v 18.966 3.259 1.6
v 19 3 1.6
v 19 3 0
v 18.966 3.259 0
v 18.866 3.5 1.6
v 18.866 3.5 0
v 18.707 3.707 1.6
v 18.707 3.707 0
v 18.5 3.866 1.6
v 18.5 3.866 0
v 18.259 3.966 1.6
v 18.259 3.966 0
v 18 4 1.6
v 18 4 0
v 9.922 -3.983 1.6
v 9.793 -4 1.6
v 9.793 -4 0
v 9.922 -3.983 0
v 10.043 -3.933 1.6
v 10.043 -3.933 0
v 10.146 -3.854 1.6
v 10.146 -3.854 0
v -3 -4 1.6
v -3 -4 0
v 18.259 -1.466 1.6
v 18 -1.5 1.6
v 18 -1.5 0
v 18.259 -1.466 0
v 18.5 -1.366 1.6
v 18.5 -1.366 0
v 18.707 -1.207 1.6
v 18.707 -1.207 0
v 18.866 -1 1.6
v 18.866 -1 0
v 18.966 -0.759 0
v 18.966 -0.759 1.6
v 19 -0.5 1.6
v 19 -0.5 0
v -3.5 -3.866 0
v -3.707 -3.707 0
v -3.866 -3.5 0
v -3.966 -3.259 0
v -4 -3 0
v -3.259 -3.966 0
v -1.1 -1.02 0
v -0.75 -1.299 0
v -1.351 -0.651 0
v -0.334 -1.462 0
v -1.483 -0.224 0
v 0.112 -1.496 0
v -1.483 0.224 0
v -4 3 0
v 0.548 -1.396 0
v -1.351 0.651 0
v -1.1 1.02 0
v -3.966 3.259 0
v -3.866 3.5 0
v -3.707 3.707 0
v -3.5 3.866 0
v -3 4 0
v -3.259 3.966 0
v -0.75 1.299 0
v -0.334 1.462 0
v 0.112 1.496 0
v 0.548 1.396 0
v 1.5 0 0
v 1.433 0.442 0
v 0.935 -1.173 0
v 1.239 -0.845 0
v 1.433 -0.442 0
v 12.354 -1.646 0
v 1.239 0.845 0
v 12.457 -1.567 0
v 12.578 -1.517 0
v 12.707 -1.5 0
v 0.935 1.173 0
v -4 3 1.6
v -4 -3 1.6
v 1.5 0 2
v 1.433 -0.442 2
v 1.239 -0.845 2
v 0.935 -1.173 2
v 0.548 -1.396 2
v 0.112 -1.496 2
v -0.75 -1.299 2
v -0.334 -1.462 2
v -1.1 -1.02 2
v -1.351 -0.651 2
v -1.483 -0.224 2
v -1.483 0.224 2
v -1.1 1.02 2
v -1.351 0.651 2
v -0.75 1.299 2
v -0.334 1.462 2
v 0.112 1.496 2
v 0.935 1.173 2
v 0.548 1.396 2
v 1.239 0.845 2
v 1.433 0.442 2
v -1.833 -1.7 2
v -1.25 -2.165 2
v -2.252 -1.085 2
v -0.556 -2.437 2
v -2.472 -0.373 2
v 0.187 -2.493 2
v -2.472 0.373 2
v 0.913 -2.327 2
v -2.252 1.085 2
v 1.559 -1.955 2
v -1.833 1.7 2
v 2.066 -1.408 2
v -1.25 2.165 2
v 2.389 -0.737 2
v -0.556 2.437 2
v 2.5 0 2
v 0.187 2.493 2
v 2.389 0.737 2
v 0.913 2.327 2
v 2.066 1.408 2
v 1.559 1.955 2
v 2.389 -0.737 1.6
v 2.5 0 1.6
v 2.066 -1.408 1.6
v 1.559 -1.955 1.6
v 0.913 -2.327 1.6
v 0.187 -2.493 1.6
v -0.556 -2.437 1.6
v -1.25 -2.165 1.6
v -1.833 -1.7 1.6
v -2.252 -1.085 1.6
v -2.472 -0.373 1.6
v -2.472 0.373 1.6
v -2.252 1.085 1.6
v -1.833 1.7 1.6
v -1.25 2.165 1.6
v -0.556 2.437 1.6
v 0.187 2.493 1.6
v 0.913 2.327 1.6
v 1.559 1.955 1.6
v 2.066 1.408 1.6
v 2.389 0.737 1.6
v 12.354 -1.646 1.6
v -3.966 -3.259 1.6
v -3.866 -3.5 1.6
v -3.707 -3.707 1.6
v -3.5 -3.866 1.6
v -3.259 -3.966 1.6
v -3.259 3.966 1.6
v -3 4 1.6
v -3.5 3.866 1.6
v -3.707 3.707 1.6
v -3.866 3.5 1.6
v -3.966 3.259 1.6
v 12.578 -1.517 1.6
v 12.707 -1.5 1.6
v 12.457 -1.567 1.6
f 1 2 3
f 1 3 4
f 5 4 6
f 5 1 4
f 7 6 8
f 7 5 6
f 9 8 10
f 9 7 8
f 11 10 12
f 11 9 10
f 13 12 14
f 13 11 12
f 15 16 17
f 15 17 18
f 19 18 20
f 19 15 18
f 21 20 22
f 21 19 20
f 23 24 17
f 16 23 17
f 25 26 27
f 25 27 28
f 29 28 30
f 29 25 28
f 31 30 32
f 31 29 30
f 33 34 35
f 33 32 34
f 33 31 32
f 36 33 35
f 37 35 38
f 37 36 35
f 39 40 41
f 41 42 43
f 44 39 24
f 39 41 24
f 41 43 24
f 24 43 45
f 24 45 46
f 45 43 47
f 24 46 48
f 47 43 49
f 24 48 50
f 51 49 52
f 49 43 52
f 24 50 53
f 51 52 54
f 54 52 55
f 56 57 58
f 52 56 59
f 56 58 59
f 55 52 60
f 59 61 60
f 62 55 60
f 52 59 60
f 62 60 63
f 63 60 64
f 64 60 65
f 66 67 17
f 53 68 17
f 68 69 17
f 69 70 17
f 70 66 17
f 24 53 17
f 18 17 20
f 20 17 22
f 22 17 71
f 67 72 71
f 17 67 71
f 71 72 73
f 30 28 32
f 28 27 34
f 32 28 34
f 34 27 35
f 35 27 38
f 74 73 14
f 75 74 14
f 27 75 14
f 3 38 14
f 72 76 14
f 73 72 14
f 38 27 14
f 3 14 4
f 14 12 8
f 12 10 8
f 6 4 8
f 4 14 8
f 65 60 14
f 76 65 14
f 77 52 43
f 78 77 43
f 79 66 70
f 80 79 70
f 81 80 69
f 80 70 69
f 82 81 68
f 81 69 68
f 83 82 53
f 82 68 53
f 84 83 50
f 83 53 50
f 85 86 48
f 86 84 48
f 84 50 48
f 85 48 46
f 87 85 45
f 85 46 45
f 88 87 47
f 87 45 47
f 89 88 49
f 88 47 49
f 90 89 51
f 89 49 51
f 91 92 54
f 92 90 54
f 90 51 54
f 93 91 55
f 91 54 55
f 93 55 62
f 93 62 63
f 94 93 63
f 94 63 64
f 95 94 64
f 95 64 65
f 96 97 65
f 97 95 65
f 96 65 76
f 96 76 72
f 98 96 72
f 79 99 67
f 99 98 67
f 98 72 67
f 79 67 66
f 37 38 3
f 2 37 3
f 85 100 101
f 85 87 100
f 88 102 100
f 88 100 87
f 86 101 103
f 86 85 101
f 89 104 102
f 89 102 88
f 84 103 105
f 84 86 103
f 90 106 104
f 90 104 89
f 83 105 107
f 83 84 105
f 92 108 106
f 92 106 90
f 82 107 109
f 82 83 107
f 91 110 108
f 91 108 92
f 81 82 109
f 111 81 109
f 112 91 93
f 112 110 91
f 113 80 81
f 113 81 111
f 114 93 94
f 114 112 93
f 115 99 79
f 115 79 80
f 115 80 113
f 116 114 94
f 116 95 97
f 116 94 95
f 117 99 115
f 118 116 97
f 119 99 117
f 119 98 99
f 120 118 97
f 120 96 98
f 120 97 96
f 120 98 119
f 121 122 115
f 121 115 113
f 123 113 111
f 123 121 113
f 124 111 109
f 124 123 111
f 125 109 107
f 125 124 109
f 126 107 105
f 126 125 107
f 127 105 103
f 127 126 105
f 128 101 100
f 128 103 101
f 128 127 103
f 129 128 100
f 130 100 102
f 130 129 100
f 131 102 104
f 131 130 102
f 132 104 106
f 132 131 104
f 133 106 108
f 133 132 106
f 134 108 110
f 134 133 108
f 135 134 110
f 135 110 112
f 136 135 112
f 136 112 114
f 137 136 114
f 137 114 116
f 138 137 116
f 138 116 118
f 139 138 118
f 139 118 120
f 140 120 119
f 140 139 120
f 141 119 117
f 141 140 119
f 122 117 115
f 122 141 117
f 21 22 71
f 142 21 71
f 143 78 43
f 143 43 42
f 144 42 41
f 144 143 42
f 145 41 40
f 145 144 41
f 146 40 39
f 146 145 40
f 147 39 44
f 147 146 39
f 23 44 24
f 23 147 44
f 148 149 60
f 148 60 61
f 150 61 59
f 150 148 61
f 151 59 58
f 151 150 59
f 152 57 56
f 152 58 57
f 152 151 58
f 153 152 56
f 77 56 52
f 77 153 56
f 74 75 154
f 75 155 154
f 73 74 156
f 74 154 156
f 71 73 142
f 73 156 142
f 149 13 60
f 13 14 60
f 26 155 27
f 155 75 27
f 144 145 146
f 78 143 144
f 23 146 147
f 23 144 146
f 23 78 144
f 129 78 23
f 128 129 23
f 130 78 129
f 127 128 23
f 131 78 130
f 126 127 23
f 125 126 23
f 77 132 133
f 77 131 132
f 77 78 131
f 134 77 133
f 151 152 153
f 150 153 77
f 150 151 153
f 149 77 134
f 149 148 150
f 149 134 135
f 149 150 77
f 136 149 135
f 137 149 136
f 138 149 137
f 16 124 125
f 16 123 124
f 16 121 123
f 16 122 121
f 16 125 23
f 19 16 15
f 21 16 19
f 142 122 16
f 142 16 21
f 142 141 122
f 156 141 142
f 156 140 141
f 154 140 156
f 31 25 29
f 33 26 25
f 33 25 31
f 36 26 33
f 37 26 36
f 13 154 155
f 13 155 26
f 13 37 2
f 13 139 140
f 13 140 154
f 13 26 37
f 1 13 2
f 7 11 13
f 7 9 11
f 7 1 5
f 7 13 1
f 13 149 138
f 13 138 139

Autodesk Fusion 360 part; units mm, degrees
sketch "スケッチ1" plane through (0, 0, 0) normal (0, 0, 1) x (1, 0, 0)
  line L0 (-4, -4) -> (10, -4)
  line L1 (10, -4) -> (12.5, -1.5)
  line L2 (12.5, -1.5) -> (19, -1.5)
  line L3 (19, -1.5) -> (19, 4)
  line L4 (19, 4) -> (-4, 4)
  line L5 (-4, 4) -> (-4, -4)
  line L6 (-4, 0) -> (0, 0) construction
  circle A0 centre (0, 0) radius 1.5
  circle A1 centre (0, 0) radius 2.5
  dimension "d1" = 23
  dimension "d2" = 8
  dimension "d3" = 5.5
  dimension "d4" = 14
  dimension "d5" = 45
  dimension "d6" = 4
  dimension "d7" = 3
  dimension "d8" = 5
extrude "押し出し1" add sketch "スケッチ1" along normal blind 1.6 contours L0 L1 L2 L3 L4 L5
extrude "押し出し2" add sketch "スケッチ1" along normal blind 2 contours A1
fillet "フィレット1" radius 1 4 edges at (-4, 4, 0.8) (19, 4, 0.8) (19, -1.5, 0.8) (-4, -4, 0.8)
fillet "フィレット2" radius 0.5 2 edges at (12.5, -1.5, 0.8) (10, -4, 0.8)
